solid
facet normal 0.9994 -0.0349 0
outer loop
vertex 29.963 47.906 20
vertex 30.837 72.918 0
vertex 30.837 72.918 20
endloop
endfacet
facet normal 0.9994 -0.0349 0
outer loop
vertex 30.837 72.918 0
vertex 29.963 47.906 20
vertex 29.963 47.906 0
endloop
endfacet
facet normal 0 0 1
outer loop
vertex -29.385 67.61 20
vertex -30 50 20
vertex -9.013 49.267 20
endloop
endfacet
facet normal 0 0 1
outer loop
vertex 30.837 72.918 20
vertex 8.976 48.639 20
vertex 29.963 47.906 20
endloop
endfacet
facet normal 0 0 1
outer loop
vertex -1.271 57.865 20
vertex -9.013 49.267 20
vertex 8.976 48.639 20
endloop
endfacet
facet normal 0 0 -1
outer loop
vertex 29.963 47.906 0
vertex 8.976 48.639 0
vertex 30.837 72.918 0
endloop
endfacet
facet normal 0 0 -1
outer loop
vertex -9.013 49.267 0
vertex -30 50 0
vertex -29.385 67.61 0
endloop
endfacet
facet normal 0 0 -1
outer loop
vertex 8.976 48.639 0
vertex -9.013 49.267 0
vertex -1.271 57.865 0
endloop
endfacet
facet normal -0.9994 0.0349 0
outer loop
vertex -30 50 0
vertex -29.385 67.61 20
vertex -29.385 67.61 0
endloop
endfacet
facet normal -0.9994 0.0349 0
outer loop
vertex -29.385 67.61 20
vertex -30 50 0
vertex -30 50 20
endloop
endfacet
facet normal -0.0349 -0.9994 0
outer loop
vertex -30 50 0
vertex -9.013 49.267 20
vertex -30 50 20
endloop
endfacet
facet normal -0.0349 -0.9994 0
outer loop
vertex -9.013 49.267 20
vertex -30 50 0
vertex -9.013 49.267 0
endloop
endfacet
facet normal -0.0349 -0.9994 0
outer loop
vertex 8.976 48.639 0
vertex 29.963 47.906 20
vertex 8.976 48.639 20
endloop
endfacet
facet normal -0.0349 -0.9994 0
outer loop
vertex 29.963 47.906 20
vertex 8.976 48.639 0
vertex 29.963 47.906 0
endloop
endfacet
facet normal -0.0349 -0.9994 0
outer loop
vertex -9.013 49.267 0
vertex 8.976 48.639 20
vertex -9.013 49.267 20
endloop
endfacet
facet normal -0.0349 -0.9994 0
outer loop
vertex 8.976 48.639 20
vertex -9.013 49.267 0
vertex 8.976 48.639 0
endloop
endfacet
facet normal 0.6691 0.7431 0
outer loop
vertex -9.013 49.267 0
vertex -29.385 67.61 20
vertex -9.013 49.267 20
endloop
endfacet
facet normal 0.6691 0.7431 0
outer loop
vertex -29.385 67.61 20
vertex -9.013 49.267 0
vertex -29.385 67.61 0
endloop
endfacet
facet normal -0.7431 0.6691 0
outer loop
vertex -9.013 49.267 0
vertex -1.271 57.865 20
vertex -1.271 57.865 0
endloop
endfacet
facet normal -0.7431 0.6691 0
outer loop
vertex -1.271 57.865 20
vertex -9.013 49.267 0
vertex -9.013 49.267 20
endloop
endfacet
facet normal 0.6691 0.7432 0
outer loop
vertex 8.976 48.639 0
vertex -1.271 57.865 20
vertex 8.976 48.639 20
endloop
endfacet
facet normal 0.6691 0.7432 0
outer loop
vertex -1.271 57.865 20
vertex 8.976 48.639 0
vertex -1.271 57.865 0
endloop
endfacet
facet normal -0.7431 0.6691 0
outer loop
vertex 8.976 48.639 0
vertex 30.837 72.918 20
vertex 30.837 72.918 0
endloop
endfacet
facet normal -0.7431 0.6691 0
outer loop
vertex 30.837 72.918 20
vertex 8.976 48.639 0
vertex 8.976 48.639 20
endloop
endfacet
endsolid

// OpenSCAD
translate([-30,50,0])
scale([3,3,1])
rotate([0,0,-2]) {
    difference() {
        cube([20, 20, 20]);
        translate([7, 0, -1]) {
            rotate([0,0,50]) {
                cube([30, 30, 30]);
            }
        }
        translate([13, 0, -1]) {
            rotate([0,0,50]) {
                cube([30, 30, 30]);
            }
        }
    }
}
